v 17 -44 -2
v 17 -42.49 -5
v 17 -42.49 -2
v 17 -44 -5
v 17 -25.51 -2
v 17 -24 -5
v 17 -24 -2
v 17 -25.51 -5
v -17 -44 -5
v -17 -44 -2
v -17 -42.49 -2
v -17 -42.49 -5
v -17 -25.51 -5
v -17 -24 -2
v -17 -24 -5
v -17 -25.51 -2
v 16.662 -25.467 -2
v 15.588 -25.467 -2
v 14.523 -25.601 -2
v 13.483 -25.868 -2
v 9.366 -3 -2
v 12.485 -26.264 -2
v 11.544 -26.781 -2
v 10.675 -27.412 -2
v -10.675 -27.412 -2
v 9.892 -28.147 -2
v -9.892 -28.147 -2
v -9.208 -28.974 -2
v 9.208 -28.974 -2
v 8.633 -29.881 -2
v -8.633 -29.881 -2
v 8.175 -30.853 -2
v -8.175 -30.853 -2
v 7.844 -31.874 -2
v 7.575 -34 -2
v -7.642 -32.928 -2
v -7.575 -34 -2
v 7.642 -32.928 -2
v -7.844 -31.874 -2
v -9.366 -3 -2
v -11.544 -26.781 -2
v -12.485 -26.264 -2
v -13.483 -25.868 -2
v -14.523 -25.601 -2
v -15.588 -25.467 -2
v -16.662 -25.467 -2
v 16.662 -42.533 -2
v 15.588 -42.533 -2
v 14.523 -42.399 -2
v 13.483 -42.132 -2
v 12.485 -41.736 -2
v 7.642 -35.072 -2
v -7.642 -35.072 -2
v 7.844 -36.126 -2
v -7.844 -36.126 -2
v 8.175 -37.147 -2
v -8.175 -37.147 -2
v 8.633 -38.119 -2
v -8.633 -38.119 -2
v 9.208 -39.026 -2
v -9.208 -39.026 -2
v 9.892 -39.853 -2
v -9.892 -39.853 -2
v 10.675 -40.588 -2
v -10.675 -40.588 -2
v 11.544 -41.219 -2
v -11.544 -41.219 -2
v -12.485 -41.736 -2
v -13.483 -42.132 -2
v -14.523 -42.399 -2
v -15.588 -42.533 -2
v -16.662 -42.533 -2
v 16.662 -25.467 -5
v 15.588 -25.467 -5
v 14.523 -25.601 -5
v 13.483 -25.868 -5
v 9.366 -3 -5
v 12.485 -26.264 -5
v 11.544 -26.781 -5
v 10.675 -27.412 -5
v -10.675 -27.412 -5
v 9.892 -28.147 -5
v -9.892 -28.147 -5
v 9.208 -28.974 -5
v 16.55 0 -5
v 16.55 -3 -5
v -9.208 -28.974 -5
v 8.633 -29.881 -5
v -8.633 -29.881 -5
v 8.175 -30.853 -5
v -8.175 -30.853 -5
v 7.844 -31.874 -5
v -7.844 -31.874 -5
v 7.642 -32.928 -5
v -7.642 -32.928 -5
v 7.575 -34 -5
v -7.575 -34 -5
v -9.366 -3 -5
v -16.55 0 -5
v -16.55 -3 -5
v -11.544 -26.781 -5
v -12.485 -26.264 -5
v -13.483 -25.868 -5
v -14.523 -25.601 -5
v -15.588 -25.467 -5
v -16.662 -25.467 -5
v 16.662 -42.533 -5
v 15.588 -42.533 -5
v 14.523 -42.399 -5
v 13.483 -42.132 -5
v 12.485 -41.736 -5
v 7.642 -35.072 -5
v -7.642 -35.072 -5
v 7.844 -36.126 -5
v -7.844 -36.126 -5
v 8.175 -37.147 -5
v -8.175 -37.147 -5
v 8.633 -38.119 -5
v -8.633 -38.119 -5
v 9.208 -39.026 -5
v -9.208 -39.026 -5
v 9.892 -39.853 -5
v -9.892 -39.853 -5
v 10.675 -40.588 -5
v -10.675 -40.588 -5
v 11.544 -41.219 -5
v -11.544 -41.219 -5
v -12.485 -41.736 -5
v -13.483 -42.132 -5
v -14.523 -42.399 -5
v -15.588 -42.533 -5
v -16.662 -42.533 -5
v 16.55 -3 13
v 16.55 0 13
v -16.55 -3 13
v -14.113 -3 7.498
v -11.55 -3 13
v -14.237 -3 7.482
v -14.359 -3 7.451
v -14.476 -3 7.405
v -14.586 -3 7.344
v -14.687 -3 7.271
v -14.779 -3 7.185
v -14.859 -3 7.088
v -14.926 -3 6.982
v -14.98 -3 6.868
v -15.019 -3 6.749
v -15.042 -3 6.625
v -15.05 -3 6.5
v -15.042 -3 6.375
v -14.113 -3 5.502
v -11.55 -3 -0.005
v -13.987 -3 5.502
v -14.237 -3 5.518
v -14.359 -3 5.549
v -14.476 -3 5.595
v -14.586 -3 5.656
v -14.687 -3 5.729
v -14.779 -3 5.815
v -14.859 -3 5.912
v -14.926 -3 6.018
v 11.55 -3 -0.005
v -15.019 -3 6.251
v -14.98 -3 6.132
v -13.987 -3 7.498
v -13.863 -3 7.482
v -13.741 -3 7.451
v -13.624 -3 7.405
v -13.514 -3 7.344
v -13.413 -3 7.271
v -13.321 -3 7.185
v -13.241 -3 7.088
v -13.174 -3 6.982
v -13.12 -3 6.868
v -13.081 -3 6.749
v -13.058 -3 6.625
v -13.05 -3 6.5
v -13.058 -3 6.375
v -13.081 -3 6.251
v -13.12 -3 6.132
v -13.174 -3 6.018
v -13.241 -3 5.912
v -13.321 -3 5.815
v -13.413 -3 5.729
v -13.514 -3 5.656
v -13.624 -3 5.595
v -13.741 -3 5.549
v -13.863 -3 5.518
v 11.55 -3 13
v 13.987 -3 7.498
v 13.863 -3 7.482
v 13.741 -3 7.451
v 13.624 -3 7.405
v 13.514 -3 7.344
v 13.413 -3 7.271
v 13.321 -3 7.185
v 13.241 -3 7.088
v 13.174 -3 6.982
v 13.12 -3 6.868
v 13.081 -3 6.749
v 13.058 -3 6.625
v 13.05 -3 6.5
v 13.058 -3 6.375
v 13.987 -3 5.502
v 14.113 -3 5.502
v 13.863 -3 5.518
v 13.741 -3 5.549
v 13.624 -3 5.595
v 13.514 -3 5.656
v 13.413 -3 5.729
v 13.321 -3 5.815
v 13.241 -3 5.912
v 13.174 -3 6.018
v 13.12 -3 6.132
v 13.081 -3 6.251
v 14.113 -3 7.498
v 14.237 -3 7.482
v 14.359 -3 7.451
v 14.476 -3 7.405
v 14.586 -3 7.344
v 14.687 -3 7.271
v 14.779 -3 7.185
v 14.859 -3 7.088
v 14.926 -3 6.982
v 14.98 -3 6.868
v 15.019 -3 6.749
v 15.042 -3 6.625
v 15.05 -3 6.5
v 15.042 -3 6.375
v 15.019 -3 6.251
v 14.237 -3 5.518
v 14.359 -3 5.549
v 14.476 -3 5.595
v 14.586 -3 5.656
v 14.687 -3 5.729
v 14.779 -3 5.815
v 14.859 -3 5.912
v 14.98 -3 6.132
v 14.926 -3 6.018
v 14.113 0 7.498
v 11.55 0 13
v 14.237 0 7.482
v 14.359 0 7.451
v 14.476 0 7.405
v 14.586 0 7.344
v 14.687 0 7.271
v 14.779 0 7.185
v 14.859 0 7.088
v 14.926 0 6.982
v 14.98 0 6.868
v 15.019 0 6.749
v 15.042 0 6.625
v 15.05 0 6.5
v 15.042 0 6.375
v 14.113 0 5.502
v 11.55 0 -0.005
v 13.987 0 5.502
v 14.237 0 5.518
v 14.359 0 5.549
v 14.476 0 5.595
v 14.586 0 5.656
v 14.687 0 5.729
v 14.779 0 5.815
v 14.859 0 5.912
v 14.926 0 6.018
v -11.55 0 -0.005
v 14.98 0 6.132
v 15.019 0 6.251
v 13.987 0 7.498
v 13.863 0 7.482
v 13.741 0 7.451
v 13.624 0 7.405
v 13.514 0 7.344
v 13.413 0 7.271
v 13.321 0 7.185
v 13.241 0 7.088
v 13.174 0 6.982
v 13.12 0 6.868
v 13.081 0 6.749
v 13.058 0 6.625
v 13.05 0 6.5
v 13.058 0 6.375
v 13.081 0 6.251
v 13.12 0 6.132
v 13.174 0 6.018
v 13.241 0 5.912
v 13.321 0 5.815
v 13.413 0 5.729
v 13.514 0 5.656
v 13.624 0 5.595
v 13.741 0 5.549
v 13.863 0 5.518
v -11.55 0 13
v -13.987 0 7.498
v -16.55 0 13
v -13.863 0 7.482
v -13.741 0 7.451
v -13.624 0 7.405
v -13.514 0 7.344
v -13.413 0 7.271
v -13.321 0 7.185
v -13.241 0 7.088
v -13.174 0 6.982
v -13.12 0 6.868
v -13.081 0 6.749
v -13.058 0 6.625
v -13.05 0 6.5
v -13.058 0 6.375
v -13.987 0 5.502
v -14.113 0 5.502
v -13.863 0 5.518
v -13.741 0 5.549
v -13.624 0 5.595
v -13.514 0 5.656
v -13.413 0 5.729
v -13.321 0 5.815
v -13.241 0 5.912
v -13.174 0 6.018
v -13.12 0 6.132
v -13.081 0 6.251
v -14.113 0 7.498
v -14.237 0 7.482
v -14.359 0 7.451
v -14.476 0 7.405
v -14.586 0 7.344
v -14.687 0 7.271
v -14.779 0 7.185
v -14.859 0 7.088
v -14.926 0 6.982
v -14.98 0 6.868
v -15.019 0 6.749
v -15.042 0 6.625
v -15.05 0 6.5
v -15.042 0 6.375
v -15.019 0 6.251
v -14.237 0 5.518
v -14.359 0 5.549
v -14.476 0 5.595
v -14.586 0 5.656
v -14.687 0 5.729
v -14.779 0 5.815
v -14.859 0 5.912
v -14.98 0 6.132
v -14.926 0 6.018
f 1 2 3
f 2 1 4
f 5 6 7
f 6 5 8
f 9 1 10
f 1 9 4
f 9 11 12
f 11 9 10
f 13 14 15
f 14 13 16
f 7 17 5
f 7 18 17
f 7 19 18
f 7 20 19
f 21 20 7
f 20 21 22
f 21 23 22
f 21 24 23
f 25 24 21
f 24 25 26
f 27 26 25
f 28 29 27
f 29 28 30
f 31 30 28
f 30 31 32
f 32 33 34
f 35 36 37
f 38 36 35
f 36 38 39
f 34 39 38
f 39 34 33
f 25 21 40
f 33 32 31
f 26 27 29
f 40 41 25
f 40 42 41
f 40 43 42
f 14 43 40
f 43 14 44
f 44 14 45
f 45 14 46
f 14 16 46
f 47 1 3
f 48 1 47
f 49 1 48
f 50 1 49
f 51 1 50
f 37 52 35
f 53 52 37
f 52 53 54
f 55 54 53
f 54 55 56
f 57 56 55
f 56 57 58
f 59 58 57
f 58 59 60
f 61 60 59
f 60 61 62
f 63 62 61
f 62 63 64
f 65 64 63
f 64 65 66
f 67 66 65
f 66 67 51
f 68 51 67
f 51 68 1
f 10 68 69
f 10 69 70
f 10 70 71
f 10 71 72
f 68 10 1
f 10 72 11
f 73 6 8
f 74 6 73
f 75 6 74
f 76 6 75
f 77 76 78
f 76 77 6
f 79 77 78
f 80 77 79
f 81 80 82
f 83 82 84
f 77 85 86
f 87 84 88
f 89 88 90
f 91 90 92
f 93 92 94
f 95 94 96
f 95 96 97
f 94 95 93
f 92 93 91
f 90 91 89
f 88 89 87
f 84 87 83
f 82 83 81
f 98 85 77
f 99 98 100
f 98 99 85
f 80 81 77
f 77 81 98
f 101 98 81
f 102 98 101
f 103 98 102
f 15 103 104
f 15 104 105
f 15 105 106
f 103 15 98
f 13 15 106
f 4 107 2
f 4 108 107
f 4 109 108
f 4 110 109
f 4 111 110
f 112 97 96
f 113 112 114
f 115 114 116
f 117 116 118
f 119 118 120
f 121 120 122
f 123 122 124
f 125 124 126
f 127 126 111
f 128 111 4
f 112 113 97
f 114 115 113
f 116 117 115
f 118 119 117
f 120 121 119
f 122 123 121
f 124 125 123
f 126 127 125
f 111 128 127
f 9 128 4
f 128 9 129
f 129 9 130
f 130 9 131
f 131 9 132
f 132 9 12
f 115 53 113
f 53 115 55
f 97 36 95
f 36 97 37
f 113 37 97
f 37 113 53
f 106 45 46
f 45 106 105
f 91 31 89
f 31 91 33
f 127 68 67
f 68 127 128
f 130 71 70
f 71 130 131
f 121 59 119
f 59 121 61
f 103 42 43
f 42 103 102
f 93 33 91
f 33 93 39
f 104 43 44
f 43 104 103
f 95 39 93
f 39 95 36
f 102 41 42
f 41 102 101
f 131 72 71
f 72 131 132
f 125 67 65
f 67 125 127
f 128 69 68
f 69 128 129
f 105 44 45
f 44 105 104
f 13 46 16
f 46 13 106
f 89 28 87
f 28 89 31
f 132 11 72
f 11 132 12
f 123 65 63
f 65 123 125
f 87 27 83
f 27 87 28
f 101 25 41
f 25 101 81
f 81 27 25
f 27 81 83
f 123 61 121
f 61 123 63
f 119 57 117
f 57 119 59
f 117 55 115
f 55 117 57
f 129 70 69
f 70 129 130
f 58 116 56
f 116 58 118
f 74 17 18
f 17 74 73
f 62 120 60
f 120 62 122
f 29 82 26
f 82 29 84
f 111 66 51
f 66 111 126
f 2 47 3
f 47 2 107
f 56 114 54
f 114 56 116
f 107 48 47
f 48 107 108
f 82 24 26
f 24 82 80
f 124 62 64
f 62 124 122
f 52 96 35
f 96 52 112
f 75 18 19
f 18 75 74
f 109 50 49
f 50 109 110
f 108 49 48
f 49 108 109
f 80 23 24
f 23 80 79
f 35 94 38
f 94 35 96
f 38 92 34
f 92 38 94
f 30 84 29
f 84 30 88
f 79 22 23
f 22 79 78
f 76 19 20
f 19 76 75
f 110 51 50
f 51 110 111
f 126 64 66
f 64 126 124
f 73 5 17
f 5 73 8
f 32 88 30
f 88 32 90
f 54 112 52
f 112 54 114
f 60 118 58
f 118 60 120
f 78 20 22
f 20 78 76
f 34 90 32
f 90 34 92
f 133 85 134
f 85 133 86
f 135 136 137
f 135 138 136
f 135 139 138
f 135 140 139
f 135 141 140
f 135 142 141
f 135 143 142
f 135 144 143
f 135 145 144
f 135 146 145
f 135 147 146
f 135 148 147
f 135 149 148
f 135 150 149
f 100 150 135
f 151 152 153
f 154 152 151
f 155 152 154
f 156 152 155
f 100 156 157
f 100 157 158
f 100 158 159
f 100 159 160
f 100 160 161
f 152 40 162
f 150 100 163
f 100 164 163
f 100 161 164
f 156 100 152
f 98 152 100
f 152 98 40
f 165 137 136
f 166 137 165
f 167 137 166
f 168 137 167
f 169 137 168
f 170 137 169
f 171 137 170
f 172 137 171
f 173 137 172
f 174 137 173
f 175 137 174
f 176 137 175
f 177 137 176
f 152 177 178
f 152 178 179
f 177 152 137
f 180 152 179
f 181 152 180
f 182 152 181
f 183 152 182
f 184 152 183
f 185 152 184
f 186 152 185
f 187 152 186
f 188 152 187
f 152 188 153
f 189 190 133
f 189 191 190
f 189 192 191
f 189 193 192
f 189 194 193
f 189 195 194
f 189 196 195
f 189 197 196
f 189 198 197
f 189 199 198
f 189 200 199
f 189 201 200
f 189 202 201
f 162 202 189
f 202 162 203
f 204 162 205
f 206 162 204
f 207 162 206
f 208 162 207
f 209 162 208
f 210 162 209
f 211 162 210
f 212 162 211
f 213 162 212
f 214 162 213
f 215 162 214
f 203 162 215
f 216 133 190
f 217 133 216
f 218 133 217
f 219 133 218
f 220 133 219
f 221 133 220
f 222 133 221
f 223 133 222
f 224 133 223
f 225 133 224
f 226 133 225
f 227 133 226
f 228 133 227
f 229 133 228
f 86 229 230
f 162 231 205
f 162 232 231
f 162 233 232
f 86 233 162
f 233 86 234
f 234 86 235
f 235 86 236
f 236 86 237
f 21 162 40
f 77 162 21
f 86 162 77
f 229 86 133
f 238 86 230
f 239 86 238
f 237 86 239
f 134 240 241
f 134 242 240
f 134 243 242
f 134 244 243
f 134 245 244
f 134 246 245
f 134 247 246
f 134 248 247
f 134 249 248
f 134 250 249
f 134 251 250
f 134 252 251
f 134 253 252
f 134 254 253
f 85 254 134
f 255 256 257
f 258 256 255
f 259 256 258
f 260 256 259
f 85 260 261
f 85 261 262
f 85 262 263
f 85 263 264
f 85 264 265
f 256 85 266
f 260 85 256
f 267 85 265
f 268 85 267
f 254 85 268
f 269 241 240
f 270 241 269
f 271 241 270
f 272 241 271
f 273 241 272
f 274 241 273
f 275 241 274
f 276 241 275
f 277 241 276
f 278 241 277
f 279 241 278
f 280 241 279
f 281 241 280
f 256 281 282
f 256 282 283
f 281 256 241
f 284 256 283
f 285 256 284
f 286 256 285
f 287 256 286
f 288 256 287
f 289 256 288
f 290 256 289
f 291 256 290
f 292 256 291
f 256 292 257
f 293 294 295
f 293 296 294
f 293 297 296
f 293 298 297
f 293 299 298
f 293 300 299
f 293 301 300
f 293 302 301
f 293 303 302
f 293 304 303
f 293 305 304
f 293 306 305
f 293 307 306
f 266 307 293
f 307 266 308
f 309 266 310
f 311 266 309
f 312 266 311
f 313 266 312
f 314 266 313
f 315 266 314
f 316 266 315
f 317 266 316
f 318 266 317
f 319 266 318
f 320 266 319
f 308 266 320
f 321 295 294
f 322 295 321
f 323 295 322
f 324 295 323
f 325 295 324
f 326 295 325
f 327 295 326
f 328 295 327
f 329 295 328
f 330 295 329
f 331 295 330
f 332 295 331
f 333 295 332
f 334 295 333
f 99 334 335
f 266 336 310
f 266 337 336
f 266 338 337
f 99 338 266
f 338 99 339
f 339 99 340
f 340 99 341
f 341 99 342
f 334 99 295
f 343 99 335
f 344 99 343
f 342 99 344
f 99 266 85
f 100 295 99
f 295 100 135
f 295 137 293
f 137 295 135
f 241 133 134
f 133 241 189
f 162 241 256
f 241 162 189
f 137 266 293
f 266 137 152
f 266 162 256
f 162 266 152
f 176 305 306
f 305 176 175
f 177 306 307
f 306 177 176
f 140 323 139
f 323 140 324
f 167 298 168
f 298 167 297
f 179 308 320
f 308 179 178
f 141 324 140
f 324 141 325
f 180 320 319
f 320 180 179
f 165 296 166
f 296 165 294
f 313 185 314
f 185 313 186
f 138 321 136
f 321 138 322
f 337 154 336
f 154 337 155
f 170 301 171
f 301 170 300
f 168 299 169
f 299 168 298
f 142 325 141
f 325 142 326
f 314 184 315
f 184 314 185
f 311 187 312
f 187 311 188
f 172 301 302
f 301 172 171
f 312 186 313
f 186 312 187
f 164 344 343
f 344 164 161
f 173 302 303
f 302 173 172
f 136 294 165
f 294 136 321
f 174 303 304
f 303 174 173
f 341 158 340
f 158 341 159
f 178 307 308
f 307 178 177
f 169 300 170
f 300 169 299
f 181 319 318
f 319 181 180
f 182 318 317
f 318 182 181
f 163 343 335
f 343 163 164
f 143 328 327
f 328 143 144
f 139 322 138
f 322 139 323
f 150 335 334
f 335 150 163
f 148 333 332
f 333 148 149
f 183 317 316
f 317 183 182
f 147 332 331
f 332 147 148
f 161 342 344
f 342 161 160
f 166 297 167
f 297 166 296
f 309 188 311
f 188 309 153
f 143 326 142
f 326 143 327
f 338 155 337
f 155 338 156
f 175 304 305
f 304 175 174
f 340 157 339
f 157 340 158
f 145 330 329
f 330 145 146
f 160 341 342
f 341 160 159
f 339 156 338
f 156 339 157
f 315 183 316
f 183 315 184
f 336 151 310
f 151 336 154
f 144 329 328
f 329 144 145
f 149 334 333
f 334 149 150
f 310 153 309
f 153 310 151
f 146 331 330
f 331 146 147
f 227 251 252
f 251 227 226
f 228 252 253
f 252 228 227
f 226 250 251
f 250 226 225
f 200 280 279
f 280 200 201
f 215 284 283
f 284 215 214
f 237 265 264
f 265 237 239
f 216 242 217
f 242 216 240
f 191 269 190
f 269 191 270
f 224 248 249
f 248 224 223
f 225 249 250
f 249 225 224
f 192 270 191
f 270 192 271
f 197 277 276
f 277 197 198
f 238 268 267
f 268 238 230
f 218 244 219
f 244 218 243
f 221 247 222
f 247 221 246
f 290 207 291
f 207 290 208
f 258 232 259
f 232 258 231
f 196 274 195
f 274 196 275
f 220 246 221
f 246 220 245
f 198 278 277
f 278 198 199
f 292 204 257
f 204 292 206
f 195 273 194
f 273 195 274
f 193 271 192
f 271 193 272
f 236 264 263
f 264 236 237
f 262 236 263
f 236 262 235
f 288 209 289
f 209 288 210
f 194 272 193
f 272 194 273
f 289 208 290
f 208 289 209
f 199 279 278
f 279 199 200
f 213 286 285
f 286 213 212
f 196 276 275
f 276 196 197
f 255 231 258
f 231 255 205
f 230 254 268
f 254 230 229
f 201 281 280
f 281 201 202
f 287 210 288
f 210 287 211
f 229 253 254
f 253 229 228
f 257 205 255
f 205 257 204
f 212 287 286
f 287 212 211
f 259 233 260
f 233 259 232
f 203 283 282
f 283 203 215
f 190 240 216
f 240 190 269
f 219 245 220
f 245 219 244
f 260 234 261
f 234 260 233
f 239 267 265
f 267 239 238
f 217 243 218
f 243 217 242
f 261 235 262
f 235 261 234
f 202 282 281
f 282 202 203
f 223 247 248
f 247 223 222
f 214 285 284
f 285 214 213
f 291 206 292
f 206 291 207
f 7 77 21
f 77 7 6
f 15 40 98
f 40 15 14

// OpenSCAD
/////////////////////////////////////
// VARIABLES

/* [Faceplate] */

//Width of Faceplace
faceWidth = 34;

//Height of Faceplate
faceHeight = 20;

//Thickness of Front Panel
faceDepth = 3;

/* [Ultrasonic Sensor] */

//Diameter of "Eyes" (Makeblock 17.1)
eyeDiameter = 17.1;

//Distance Between Centers of "Eyes" (Makeblock 32.25)
eyeCentersDistance = 32.25;

//Thickness of the attached Circuitboard (Makeblock 2)
eyeBoardThickness = 2;

/* [Middle] */

//Height from Bottom of Faceplate to bottom of Bracket (Makeblock at least 24)
middleHeight = 24;

//Percentage of connection of the middle to the bottom
middleBottomPercentage = .75; //[.50:.01:1.00]

/* [Servo Bracket] */

//Depth of Servo (Makeblock 13)
servoDepth = 13;

//Width of space between bottom brackets(Makeblock 23.1)
servoWidth = 23.1;

//Height/Thickness of lower side brackets
bracketHeight = 3;

//Width of the lower side brackets (Makeblock 5)
bracketWidth = 5;

//Diameter of Screw Holes (Makeblock 2)
screwDiameter = 2.0;


/* [Hidden] */
servoTopHeight = 15;


/////////////////////////////////////
// CONSTANTS

bracketTotalWidth = servoWidth + bracketWidth*2;

bracketLCenterX = 0 - ((bracketTotalWidth/2))+ bracketWidth/2;
bracketRCenterX = 0 + ((bracketTotalWidth/2))- bracketWidth/2;

bracketCenterY = servoDepth/2;

/////////////////////////////////////
// RENDERS
rotate ([90,0,0])
{
translate ([0,-(faceDepth/2)-eyeBoardThickness,middleHeight+(faceHeight/2)]) face();

rotate ([90,0,0]) translate([0-(bracketTotalWidth/2),0,eyeBoardThickness]) middle();

translate ([0,0,(servoTopHeight/2)]) lowerBracket();
}
/////////////////////////////////////
// MODULES

module middle()
{
    linear_extrude(height = faceDepth)
    polygon(points=[[(bracketTotalWidth-(bracketTotalWidth*middleBottomPercentage)),0],[-(faceWidth-bracketTotalWidth)/2,middleHeight],[bracketTotalWidth+(faceWidth-bracketTotalWidth)/2,middleHeight],[(bracketTotalWidth-(1-middleBottomPercentage)*bracketTotalWidth),0]]);
}

module screw()
{
    cylinder (h = bracketHeight*2, r=screwDiameter/2, center = true, $fn=50);
}

module lowerBracket()
{
    difference()
    {
    
        difference()
        {
        
        difference(){
    
            translate ([
                0,
                servoDepth-((servoDepth+faceDepth+eyeBoardThickness)/2),
                (0-(servoTopHeight/2))+ (bracketHeight/2)])
            cube([
                servoWidth + bracketWidth*2,
                servoDepth+faceDepth+eyeBoardThickness,
                bracketHeight], center = true);
            
    
          translate ([0,(servoDepth/2),0])
            servoTop();
    
    

        }  
      translate ([bracketLCenterX,bracketCenterY,(0-(servoTopHeight/2))+ (bracketHeight/2)]) screw();  
        
    }
    translate ([bracketRCenterX,bracketCenterY,(0-(servoTopHeight/2))+ (bracketHeight/2)]) screw();
    }
}

module servoTop()
{
    cube([servoWidth,servoDepth+.01,servoTopHeight+.01], center = true);
}
module face()
{
    difference()
    {
        difference()
        {
            cube([faceWidth,faceDepth,faceHeight], center = true);    
            translate ([-(eyeCentersDistance/2),faceDepth,0]) eyeHole();
            //translate ([0-(eyeCentersDistance/2),15,faceHeight/2]) eyeHole();
        }
    
        translate ([(eyeCentersDistance/2),faceDepth,0]) eyeHole();
    }
}


module eyeHole()
{
    rotate([90,0,0])
    linear_extrude( height = faceDepth*2)
    circle(d=eyeDiameter,$fn=50, center = true);
}
